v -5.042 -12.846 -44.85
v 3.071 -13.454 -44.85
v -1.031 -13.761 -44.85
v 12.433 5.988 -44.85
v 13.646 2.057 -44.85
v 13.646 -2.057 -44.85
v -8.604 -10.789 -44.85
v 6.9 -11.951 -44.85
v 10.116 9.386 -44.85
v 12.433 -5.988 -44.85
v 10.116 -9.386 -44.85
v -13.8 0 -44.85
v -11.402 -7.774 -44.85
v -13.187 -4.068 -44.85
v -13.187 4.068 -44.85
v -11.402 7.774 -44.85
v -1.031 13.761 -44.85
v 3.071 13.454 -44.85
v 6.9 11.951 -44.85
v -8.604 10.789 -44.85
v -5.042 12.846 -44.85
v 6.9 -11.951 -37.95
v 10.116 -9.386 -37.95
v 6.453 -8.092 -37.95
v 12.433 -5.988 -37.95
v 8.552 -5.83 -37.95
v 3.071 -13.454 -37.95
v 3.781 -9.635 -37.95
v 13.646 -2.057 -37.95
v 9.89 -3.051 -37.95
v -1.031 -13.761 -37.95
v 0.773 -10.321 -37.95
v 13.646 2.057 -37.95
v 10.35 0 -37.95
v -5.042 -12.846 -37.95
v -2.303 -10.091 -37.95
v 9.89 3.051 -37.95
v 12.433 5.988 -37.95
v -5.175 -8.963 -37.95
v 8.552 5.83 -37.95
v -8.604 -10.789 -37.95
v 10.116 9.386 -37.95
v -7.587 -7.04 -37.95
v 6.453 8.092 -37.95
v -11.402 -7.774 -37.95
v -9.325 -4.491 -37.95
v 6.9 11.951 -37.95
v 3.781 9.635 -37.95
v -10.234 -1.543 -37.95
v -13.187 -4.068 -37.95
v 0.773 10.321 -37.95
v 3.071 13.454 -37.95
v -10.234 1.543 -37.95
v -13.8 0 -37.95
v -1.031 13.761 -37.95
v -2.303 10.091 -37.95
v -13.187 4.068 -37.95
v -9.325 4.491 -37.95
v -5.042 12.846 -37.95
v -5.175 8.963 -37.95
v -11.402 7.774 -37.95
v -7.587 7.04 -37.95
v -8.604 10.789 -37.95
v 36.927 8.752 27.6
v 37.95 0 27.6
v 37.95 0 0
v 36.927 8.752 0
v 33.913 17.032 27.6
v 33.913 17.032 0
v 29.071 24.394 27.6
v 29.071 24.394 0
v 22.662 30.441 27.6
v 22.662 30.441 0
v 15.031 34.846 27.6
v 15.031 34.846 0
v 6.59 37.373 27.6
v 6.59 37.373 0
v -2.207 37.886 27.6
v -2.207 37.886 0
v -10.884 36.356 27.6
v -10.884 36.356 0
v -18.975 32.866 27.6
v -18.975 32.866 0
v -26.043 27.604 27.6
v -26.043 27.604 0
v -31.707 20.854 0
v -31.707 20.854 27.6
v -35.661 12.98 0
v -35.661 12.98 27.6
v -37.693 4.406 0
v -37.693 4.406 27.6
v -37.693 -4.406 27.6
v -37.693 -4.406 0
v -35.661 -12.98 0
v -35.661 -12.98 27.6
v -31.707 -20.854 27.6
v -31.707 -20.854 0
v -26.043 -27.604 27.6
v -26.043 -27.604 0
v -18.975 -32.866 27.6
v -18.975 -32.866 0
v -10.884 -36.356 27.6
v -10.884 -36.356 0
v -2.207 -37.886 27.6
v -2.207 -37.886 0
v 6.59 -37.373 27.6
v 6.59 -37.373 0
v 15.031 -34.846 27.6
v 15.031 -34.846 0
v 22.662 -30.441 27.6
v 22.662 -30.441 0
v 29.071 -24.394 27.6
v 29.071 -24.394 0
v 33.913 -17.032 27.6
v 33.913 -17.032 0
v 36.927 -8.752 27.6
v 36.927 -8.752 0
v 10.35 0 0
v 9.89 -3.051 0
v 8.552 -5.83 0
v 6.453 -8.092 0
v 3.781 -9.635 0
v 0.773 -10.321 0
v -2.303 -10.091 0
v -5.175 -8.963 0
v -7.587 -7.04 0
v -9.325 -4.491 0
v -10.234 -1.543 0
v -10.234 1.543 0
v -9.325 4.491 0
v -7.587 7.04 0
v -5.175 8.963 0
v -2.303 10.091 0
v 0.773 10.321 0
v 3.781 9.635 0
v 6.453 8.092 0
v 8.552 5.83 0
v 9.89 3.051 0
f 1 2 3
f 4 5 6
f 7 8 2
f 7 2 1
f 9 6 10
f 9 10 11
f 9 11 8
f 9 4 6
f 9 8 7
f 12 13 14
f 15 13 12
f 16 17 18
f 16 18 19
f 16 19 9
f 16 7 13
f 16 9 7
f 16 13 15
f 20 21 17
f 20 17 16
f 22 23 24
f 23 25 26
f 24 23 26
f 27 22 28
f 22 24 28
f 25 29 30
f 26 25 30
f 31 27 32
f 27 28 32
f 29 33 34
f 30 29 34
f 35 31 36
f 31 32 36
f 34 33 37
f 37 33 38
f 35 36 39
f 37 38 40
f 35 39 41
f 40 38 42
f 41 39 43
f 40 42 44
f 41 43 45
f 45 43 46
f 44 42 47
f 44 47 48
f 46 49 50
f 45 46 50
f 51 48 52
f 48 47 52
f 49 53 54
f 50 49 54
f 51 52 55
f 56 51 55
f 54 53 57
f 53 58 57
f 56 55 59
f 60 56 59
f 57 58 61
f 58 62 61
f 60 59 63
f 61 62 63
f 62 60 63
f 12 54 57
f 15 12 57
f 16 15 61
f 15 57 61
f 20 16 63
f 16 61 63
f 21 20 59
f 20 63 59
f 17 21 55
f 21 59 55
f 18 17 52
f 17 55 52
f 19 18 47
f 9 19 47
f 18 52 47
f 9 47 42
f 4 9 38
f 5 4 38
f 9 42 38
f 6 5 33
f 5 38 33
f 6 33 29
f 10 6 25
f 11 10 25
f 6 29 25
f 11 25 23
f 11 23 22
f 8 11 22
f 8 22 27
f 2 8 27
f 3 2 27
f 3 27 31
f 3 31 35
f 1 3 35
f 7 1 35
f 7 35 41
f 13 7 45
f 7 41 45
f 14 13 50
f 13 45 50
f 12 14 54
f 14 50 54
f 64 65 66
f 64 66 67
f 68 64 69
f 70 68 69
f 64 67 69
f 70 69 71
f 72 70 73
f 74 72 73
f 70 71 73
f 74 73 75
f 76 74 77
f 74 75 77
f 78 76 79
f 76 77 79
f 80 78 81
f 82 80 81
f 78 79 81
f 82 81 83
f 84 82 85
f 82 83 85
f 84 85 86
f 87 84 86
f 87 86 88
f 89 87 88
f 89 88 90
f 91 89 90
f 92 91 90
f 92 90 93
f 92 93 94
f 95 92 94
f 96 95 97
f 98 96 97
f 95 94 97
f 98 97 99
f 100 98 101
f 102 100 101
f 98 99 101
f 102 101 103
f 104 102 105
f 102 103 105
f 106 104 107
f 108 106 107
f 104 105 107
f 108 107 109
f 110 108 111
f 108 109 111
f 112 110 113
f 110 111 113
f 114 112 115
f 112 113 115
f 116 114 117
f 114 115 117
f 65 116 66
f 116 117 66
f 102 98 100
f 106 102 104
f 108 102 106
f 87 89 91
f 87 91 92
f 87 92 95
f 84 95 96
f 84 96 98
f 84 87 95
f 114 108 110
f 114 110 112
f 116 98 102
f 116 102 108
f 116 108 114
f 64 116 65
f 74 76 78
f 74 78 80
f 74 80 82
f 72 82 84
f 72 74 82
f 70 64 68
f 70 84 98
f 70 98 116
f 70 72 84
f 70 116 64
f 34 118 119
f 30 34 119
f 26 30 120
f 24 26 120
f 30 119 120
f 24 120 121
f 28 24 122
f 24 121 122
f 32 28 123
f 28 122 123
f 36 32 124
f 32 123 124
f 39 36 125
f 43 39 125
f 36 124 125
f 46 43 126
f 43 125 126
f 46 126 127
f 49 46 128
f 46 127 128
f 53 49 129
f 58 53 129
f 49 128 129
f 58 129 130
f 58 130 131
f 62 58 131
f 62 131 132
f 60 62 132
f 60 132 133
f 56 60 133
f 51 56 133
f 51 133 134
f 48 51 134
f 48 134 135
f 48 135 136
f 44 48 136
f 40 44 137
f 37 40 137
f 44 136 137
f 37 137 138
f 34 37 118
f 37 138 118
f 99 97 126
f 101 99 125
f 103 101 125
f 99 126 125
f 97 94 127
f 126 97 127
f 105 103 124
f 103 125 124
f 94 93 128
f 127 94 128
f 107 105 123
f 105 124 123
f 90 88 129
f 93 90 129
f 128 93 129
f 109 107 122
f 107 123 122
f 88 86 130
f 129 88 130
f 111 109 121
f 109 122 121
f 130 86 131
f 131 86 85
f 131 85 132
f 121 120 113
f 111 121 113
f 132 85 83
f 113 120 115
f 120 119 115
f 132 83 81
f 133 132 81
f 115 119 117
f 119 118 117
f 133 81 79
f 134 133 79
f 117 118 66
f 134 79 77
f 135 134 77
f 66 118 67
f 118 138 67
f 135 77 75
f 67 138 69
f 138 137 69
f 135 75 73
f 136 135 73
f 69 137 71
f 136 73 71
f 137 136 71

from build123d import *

# Parameters (mm, degrees)
SKETCH_1_R      = 110
EXTRUDE_1_DEPTH = 80
SKETCH_2_R      = 30
EXTRUDE_2_DEPTH = 110
SKETCH_3_R      = 40
EXTRUDE_3_DEPTH = 20
SCALE_1_SCALE   = 0.345


with BuildPart() as part:
    # 草图1 → 凸台-拉伸1 (new body)
    with BuildSketch(Plane.XY):
        Circle(SKETCH_1_R)
    extrude(amount=EXTRUDE_1_DEPTH)

    # 草图2 → 凸台-拉伸2 (add)
    with BuildSketch(Plane(origin=(0, 0, 0), x_dir=(-1, 0, 0), z_dir=(0, 0, -1))):
        with Locations(Location((0, 0, 0), (0, 0, 180))):
            Circle(SKETCH_2_R)
    extrude(amount=EXTRUDE_2_DEPTH)

    # 草图3 → 凸台-拉伸3 (add)
    with BuildSketch(Plane(origin=(0, 0, -110), x_dir=(-1, 0, 0), z_dir=(0, 0, -1))):
        Circle(SKETCH_3_R)
    extrude(amount=EXTRUDE_3_DEPTH)


with BuildPart() as part_1:
    # 缩放比例1: scaled about (0, 0, 0)
    add(part.part.scale(SCALE_1_SCALE))


solid = part_1.part
